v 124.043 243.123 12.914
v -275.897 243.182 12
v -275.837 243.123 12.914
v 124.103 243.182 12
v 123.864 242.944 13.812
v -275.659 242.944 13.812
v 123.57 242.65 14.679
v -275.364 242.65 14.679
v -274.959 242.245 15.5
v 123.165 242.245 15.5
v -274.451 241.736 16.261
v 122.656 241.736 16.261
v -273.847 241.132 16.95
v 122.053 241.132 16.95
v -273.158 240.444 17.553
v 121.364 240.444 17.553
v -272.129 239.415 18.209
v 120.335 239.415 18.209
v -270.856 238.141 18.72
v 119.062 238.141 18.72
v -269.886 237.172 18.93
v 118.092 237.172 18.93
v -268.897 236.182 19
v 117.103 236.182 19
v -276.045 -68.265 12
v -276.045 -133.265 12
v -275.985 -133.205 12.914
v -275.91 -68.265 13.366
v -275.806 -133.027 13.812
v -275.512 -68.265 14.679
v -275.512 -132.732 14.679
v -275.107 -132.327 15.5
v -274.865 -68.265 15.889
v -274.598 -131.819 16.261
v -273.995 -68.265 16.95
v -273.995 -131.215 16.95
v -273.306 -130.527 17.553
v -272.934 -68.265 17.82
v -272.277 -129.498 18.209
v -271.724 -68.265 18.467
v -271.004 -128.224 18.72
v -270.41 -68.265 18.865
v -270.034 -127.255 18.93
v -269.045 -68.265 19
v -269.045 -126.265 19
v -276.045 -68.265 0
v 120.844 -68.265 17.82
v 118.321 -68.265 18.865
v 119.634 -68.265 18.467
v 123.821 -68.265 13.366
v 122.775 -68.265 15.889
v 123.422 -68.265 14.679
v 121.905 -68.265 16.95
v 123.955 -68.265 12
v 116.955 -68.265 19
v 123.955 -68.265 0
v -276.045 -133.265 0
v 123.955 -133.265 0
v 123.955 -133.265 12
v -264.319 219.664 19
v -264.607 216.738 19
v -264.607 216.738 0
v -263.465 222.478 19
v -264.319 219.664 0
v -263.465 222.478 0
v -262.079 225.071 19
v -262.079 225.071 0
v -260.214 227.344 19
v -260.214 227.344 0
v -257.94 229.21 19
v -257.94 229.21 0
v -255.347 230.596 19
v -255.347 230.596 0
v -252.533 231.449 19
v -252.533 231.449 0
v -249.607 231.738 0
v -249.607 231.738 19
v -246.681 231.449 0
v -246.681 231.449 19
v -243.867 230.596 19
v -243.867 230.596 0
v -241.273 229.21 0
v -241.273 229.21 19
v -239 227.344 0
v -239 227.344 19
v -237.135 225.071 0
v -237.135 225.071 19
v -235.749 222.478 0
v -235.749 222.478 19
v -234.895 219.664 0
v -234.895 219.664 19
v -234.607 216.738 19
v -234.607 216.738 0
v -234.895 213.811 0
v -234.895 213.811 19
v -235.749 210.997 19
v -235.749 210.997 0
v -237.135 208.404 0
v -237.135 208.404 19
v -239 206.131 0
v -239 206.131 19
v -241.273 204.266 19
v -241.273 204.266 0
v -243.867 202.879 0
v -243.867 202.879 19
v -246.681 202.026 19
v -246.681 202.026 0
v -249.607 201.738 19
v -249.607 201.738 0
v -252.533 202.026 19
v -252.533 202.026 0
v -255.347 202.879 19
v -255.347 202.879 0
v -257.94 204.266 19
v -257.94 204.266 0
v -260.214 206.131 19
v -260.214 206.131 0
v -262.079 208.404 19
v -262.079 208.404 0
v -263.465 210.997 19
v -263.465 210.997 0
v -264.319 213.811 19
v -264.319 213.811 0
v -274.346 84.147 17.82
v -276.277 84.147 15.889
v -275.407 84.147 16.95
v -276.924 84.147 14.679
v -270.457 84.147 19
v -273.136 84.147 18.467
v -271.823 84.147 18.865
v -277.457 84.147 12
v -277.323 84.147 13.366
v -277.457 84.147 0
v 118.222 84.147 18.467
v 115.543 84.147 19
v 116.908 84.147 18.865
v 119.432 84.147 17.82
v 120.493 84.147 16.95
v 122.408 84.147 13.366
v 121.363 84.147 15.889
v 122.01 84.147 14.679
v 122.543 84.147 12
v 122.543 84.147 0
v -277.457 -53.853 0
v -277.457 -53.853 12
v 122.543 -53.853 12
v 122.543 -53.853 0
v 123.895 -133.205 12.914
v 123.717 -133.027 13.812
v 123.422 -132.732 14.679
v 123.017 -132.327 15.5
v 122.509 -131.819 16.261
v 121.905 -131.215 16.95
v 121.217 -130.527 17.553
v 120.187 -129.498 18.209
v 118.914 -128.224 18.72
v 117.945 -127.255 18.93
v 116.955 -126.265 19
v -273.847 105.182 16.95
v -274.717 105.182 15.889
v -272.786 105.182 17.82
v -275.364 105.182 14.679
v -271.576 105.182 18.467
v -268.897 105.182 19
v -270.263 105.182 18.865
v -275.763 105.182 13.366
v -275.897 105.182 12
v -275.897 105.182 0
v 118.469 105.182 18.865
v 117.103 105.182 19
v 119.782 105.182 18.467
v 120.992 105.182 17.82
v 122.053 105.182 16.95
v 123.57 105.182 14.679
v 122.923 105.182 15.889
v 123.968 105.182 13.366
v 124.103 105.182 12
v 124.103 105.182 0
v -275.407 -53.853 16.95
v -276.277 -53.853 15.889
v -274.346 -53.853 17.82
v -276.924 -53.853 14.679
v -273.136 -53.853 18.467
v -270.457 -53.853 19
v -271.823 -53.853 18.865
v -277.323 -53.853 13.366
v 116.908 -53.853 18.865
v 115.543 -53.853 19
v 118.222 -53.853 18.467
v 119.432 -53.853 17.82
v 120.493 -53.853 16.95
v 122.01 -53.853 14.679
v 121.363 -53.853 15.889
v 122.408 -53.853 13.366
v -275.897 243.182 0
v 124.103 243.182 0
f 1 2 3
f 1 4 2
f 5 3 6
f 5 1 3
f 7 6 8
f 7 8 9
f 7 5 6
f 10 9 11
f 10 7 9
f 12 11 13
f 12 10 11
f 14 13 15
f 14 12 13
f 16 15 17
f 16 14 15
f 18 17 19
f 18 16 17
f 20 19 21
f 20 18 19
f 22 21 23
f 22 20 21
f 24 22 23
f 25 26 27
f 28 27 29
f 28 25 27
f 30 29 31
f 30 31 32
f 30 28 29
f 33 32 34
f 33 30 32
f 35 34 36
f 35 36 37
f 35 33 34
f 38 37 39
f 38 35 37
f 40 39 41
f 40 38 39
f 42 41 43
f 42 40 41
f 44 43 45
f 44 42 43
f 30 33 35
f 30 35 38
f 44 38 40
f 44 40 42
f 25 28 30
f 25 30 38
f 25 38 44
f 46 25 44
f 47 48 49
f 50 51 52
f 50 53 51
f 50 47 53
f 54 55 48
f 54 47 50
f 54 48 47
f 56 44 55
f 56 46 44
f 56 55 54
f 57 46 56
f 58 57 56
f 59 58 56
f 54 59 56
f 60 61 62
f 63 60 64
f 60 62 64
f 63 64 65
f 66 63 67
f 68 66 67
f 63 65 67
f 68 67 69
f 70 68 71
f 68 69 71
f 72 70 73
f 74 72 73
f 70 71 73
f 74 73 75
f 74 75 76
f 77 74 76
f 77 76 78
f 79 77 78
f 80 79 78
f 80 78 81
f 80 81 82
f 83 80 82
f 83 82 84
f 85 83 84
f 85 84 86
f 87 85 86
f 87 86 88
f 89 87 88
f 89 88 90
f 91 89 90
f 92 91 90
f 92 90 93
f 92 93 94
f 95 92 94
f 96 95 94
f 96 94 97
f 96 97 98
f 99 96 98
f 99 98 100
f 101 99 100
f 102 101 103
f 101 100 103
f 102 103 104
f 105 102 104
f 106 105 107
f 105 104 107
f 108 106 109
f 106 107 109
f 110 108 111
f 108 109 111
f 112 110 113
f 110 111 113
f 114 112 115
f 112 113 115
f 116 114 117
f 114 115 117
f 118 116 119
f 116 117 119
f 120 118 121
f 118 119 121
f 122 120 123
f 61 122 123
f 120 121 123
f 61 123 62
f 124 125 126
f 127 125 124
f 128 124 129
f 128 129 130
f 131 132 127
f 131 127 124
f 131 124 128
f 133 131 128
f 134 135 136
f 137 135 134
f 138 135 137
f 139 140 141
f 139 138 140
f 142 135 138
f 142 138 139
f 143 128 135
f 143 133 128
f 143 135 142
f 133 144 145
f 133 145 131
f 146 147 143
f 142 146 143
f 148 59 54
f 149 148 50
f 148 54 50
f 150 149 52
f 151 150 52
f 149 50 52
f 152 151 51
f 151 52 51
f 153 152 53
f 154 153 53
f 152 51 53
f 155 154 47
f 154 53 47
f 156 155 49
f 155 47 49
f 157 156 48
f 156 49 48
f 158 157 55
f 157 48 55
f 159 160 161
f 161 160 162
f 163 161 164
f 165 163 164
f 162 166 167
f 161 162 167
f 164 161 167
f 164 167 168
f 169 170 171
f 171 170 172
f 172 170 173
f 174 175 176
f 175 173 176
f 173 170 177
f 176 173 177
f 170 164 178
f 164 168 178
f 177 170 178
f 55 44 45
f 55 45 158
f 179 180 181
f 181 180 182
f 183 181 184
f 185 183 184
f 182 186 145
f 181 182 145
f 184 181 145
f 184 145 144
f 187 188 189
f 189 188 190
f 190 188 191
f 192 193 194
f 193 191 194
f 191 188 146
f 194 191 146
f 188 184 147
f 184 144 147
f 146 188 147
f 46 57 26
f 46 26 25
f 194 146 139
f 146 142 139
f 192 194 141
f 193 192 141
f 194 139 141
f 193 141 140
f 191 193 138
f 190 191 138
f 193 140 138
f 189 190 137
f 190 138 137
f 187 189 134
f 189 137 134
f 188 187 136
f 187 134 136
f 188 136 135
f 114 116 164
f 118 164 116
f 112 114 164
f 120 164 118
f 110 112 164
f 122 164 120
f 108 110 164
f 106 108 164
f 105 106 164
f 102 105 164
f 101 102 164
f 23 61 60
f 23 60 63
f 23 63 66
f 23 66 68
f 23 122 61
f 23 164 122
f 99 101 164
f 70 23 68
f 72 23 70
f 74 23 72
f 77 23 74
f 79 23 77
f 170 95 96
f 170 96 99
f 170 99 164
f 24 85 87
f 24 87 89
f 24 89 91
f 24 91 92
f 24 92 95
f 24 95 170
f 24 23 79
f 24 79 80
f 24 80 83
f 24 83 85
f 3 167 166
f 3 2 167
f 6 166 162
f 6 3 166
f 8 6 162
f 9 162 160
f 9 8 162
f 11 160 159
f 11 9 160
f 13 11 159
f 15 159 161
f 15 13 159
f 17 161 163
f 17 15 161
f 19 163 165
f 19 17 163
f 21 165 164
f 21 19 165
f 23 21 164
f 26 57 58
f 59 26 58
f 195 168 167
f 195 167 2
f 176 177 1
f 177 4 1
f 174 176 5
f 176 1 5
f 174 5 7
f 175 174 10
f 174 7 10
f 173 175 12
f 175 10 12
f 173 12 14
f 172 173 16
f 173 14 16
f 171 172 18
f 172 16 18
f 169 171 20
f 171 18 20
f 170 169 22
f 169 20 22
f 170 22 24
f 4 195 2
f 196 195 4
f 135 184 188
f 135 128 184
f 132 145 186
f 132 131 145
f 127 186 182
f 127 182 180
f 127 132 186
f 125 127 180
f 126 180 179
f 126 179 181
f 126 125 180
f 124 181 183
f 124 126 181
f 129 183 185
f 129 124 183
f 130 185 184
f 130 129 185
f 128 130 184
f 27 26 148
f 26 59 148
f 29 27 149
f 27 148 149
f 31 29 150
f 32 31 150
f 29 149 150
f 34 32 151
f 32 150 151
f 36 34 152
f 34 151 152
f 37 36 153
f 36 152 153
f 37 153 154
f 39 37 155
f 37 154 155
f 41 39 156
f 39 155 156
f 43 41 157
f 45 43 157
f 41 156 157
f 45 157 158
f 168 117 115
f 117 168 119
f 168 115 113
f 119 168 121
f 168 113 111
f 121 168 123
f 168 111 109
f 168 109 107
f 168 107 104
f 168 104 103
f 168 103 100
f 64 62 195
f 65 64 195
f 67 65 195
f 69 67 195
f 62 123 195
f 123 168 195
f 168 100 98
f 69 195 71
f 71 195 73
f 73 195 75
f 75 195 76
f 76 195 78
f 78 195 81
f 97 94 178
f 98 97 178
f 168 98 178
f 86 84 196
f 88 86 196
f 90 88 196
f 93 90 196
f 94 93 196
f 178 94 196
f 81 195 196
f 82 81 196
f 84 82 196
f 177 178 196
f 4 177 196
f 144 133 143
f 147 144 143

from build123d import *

# Parameters (mm, degrees)
F0_W     = 400
F0_H     = 65
F0_H_2   = 138
F1_DEPTH = 19
F2_R     = 7
F4_D     = 30


with BuildPart() as f1:
    # F0 (on Top) → F1 (new body)
    with BuildSketch(Plane.XY):
        with Locations((-76.044816, -100.765272)):
            Rectangle(F0_W, F0_H)
        with Locations((-77.457201, 15.146514)):
            Rectangle(F0_W, F0_H_2)
        with Locations((-75.897102, 174.182409)):
            Rectangle(F0_W, F0_H_2)
    extrude(amount=F1_DEPTH)

    # F2
    f2_edges = [f1.edges().sort_by_distance(p)[0] for p in [
        (124.102898, 174.182409, 19),
        (-75.897102, 243.182409, 19),
        (-275.897102, 174.182409, 19),
        (122.542799, 15.146514, 19),
        (-277.457201, 15.146514, 19),
        (-276.044816, -100.765272, 19),
        (-76.044816, -133.265272, 19),
        (123.955184, -100.765272, 19),
    ]]
    fillet(f2_edges, radius=F2_R)

    # F4 (through all)
    with Locations(Plane.XY.offset(19)):
        with Locations((-249.606907, 216.737688)):
            Hole(F4_D / 2)


solid = f1.part
